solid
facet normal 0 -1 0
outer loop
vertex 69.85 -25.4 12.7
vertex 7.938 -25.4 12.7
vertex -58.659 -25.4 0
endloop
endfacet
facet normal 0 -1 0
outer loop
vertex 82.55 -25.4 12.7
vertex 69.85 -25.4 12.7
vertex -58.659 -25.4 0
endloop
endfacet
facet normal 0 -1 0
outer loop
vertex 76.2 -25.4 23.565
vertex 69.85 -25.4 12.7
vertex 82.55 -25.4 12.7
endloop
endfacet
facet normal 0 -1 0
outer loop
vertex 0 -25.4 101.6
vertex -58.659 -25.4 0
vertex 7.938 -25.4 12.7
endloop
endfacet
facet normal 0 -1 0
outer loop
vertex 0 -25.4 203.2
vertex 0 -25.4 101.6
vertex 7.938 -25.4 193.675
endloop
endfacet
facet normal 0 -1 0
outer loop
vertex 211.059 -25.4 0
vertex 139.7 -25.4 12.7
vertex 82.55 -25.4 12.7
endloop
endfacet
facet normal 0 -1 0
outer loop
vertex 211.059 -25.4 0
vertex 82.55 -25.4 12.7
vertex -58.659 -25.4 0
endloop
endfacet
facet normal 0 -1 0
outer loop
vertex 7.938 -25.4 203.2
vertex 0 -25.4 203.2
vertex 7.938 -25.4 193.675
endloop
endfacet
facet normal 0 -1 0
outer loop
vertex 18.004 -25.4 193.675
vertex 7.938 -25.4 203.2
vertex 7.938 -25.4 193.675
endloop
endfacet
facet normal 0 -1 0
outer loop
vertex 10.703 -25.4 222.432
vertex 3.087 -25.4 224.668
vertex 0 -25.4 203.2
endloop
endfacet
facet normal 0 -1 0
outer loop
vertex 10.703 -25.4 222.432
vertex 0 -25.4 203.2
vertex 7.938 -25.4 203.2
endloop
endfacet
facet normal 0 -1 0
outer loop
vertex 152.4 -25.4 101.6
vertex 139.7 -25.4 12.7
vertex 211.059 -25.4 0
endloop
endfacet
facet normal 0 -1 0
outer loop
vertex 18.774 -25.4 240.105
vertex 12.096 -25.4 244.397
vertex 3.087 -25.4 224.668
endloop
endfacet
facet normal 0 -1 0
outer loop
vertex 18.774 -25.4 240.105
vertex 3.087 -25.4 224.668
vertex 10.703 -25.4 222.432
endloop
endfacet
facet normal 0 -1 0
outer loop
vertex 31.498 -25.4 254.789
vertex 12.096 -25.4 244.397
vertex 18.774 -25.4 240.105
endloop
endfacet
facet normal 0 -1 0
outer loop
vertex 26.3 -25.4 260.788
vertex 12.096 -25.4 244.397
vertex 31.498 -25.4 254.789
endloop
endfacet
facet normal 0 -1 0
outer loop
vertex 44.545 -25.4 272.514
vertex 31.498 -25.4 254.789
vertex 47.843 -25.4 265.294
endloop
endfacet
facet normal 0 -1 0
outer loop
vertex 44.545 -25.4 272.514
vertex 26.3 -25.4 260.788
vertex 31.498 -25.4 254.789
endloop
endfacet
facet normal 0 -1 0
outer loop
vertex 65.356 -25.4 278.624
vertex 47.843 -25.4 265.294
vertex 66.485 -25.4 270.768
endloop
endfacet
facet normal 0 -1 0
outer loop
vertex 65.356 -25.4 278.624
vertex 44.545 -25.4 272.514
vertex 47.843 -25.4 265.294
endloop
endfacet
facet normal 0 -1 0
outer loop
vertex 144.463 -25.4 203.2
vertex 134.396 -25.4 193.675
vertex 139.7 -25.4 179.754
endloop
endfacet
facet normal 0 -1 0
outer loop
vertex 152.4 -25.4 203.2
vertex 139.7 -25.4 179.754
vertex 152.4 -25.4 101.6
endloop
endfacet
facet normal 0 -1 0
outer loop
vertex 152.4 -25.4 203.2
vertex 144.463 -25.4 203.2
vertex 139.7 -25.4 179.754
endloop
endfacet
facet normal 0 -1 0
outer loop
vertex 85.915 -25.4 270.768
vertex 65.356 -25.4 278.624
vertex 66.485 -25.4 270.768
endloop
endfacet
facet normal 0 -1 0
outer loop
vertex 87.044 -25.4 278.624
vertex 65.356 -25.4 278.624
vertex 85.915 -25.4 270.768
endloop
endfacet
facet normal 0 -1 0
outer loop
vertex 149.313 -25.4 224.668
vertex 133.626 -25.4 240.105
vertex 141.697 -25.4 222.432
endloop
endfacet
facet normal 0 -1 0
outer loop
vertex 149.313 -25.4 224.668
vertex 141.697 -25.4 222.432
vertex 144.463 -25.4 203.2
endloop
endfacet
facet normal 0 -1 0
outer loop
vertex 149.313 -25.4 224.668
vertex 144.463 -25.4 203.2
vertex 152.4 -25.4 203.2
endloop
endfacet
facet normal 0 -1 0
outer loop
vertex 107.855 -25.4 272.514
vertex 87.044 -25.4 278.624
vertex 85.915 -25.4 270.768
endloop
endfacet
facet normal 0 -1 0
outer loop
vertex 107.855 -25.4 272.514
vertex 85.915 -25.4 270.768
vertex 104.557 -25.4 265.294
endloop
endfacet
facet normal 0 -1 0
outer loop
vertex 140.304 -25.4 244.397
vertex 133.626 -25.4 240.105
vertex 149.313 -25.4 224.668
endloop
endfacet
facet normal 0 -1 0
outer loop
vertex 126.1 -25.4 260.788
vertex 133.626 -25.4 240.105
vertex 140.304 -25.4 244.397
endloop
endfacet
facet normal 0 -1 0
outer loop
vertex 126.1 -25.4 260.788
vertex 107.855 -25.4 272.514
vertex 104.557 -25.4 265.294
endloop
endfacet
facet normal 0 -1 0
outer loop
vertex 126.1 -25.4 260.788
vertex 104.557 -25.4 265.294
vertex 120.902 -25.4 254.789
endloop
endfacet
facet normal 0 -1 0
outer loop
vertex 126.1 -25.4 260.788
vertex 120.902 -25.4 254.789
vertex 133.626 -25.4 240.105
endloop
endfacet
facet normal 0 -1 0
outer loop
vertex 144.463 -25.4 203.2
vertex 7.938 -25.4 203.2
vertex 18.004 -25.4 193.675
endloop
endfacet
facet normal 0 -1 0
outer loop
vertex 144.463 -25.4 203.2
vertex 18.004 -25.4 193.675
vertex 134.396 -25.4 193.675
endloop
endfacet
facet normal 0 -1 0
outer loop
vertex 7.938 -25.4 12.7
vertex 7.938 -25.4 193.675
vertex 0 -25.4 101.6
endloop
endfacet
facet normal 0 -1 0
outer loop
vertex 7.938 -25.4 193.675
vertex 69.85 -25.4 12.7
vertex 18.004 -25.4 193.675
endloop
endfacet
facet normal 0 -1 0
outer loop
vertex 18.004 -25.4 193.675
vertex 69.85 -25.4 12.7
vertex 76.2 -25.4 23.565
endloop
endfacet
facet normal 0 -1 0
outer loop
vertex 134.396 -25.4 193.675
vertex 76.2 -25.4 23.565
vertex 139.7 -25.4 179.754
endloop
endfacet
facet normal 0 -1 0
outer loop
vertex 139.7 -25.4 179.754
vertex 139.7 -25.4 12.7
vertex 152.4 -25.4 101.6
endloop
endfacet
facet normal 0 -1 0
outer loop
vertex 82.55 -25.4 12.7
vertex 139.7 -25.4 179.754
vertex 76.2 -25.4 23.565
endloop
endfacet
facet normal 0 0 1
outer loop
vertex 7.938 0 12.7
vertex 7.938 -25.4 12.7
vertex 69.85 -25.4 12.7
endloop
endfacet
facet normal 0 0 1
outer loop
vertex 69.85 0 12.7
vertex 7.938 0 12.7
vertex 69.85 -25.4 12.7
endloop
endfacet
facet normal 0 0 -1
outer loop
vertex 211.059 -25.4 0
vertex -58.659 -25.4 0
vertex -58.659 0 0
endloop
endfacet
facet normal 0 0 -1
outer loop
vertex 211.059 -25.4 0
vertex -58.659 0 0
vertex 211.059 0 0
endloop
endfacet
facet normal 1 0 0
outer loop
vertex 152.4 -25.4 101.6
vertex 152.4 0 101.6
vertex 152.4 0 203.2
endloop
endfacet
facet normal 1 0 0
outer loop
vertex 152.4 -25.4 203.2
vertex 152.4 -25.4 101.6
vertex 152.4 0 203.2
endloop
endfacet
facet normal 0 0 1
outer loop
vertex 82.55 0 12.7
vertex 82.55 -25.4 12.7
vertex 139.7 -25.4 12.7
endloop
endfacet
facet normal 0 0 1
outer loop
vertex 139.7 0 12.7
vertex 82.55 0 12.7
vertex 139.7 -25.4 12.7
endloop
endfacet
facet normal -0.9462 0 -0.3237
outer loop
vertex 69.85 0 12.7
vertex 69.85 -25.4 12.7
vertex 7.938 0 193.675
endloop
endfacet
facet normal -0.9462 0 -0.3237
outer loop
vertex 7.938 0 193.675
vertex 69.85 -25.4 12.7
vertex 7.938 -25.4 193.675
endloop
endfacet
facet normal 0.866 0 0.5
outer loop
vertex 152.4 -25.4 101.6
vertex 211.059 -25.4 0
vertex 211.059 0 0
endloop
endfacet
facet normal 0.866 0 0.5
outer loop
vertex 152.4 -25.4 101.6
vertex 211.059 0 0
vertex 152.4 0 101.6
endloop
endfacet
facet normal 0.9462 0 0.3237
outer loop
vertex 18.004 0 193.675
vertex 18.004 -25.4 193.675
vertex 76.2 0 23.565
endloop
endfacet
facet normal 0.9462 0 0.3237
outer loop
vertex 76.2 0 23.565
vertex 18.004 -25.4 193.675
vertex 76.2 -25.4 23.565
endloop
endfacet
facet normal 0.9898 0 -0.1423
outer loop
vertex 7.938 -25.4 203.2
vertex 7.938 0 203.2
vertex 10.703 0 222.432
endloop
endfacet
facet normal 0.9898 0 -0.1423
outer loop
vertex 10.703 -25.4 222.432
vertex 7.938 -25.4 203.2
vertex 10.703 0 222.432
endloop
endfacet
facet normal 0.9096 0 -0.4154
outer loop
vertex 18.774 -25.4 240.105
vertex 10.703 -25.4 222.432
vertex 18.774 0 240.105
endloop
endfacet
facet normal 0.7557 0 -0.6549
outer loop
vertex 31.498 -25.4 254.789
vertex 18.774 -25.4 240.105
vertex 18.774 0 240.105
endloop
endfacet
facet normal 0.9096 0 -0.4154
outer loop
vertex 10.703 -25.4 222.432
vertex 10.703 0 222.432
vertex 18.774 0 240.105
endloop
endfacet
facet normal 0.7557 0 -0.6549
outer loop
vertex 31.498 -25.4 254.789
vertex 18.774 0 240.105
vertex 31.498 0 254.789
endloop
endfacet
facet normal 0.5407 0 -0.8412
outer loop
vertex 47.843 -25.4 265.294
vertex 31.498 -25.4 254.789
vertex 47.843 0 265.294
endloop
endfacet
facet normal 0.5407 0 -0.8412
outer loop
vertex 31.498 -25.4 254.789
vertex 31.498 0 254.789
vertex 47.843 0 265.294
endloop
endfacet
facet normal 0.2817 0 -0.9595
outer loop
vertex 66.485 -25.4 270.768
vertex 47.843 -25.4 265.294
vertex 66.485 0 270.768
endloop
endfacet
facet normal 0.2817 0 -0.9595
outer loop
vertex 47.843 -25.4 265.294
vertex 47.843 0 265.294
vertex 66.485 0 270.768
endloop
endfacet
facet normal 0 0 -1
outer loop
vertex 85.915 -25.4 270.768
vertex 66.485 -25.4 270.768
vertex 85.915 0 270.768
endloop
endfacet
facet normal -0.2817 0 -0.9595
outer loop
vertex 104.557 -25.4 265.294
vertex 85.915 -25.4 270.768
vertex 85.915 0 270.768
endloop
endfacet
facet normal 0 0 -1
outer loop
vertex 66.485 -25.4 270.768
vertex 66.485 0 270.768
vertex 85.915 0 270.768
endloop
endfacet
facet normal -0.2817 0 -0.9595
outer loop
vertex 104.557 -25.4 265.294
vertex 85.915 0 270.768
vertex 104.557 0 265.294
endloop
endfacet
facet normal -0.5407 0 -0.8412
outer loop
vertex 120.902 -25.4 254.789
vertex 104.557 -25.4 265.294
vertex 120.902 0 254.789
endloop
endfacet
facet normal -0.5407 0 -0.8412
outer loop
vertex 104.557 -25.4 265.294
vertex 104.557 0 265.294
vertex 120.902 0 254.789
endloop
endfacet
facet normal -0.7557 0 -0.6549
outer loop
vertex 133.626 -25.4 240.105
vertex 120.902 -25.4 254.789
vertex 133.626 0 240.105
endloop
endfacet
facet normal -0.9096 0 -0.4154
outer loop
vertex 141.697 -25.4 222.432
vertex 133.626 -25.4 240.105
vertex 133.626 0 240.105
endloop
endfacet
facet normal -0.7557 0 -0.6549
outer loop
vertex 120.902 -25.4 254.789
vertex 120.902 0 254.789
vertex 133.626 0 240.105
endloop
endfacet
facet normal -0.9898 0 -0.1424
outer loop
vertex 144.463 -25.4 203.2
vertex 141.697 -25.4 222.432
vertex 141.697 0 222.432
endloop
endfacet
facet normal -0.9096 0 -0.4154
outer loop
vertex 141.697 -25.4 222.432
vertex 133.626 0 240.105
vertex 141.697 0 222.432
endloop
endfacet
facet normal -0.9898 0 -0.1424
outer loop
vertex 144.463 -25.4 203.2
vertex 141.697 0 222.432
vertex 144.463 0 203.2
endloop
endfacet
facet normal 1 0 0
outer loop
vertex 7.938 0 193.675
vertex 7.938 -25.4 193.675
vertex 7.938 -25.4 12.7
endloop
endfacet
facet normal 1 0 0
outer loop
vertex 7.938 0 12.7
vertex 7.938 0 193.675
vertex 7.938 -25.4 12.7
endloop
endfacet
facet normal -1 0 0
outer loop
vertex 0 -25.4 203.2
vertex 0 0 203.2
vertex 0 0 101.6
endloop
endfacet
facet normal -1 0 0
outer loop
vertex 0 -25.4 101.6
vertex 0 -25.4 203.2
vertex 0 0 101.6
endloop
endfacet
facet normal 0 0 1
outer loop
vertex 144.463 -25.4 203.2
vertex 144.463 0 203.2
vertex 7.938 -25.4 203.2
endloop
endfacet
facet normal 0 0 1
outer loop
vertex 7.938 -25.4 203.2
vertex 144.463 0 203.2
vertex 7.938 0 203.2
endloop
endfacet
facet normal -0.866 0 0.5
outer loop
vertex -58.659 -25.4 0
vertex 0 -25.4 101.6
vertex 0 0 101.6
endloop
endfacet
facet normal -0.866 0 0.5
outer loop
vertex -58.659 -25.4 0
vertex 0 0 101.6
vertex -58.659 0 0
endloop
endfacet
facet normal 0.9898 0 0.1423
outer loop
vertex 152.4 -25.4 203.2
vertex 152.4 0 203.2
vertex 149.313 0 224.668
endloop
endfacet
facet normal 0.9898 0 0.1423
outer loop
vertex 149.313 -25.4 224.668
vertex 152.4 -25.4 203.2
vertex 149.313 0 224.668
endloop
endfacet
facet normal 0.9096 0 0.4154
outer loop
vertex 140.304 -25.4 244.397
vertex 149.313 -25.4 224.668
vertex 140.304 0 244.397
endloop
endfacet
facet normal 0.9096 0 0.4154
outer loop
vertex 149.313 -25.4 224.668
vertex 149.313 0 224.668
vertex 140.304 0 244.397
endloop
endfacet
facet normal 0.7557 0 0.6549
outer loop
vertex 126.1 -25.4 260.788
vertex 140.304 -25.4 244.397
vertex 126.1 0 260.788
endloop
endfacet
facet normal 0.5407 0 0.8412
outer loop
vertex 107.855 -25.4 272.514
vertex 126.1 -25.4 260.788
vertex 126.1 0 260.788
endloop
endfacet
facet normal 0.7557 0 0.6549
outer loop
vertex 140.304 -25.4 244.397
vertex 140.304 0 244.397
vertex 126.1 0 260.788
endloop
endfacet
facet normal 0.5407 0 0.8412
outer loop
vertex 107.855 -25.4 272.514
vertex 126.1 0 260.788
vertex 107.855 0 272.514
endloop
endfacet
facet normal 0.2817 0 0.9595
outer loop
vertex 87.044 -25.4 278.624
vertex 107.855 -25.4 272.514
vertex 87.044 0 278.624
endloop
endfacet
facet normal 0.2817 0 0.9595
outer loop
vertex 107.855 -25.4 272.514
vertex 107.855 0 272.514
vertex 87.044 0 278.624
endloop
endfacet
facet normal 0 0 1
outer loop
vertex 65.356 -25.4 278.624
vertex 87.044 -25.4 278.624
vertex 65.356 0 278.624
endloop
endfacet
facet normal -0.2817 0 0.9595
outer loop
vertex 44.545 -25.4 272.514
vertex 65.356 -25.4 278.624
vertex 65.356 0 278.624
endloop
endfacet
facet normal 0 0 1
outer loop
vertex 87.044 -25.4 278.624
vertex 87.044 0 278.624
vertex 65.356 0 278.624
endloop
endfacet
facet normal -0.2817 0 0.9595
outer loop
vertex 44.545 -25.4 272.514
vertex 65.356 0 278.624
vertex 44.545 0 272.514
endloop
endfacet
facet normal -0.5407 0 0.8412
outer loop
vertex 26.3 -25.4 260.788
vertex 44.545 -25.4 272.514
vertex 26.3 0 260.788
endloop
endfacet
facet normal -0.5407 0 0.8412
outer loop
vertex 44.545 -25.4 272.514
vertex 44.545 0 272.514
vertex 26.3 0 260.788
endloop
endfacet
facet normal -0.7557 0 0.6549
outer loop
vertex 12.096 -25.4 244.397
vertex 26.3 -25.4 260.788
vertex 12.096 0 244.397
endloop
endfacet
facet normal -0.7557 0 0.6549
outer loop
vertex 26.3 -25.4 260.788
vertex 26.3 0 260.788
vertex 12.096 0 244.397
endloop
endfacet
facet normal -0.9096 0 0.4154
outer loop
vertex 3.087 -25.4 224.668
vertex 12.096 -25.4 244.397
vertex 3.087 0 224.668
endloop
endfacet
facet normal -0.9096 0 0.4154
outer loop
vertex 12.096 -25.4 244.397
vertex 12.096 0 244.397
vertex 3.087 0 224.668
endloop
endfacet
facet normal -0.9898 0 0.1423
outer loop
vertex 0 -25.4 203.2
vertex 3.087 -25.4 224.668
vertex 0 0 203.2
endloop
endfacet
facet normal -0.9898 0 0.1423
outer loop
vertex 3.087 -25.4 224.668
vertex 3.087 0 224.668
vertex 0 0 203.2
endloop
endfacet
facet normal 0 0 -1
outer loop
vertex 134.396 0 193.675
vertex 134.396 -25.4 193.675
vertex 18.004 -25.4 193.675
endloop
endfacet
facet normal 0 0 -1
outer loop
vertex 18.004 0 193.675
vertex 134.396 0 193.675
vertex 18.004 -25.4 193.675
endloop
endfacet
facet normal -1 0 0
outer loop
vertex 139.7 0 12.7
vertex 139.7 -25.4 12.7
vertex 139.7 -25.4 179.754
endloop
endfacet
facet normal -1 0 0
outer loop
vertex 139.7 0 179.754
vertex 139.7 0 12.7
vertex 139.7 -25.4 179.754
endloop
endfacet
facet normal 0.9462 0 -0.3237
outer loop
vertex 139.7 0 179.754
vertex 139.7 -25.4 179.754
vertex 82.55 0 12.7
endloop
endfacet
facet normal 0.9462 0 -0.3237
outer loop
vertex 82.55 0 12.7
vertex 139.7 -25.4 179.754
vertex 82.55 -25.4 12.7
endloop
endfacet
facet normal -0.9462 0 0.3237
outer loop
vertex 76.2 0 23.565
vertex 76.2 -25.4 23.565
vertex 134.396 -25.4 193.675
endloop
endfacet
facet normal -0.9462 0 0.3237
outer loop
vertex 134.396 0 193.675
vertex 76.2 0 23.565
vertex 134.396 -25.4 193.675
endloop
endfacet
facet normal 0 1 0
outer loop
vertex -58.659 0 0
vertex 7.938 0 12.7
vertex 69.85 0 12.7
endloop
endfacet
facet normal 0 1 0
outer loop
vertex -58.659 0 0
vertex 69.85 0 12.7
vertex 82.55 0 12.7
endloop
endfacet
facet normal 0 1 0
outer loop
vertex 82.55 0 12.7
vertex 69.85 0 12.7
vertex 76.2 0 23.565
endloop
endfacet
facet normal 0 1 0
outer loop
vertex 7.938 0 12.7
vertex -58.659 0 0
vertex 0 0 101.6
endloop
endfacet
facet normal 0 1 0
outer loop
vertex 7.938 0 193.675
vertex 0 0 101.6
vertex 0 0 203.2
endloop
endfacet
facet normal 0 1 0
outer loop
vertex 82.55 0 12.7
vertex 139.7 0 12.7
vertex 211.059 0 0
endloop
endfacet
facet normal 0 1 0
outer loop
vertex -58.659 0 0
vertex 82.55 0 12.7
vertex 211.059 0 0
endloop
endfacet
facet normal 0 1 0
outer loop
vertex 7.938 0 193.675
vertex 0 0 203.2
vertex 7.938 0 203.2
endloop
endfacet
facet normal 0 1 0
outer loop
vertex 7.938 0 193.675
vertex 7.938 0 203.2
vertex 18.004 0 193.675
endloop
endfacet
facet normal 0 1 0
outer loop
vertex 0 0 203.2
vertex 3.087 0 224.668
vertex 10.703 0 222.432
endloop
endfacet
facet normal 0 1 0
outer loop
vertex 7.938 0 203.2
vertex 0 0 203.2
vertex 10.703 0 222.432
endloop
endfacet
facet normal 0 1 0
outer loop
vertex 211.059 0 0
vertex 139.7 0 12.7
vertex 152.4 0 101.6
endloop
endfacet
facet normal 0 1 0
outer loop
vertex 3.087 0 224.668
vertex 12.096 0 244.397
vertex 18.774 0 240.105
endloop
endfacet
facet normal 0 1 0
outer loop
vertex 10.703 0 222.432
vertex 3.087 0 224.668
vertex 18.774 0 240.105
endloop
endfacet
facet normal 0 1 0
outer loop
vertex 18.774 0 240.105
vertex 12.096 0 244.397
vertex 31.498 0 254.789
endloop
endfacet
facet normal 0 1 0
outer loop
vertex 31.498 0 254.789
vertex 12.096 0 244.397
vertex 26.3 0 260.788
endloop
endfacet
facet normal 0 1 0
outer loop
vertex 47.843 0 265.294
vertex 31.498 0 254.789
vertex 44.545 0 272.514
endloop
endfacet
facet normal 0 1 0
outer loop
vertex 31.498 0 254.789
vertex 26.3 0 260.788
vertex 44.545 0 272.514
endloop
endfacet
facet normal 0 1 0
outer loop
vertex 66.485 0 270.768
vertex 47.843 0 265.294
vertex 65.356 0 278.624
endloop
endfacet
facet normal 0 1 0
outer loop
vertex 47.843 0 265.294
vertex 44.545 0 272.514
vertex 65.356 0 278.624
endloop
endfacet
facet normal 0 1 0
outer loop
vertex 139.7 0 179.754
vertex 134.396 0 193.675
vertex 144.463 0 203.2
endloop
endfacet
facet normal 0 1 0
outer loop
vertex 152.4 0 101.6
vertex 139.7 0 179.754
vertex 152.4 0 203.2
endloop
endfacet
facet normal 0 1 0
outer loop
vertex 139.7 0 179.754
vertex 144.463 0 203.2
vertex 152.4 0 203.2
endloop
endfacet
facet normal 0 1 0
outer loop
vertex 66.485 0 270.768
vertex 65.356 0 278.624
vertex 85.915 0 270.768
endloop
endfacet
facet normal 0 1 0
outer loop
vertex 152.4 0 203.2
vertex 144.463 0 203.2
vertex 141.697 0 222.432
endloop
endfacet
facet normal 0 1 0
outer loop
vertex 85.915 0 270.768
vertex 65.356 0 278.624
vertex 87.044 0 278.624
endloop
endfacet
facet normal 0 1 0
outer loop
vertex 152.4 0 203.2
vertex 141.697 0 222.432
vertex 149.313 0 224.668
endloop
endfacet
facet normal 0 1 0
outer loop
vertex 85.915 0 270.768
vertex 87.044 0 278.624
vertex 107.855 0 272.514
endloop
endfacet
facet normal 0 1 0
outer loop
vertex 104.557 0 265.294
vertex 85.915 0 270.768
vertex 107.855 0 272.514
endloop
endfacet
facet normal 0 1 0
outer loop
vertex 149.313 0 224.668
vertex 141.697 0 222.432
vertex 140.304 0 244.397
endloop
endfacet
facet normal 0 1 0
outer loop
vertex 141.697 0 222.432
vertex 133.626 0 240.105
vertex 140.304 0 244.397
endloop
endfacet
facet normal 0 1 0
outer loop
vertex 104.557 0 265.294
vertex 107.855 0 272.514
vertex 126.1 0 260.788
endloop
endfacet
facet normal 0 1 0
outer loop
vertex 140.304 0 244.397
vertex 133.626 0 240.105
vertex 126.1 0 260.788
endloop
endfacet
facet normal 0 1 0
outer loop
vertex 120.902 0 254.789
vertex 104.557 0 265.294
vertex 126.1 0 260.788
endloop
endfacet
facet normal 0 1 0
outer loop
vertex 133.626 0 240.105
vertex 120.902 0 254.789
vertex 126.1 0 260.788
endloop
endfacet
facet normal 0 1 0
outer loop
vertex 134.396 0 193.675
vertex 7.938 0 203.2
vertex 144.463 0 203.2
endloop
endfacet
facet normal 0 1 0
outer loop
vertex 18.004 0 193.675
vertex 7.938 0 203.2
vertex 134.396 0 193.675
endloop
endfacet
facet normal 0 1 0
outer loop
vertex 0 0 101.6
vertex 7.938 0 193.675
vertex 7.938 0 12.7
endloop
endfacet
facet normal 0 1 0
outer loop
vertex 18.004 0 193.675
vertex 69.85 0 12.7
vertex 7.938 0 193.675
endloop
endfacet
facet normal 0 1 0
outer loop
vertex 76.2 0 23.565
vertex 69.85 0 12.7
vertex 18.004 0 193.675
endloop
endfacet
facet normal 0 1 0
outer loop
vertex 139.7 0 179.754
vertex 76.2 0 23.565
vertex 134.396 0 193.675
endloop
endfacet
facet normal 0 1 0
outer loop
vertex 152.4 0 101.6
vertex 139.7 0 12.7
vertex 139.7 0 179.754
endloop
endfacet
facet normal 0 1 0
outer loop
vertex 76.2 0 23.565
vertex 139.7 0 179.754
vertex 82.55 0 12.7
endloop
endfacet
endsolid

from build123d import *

# Parameters (mm, degrees)
F1_DEPTH = 25.4
F3_DEPTH = 25.401
F5_DEPTH = 25.4


with BuildPart() as f1:
    # F0 (on Front) → F1 (new body)
    with BuildSketch(Plane.XZ):
        with BuildLine():
            Line((0, 203.2), (0, 0))
            Line((0, 0), (152.4, 0))
            Line((152.4, 0), (152.4, 203.2))
            ThreePointArc((152.4, 203.2), (76.2, 279.4), (0, 203.2))
        make_face()
        with BuildLine():
            ThreePointArc((7.9375, 203.2), (76.2, 271.4625), (144.4625, 203.2))
            Line((144.4625, 203.2), (7.9375, 203.2))
        make_face(mode=Mode.SUBTRACT)
    extrude(amount=F1_DEPTH)

    # F2 (on face) → F3 (cut, through all)
    with BuildSketch(Plane.XZ.offset(25.4)):
        Polygon((7.9375, 193.675), (7.9375, 12.7), (69.85, 12.7), align=None)
        Polygon((139.7, 12.7), (139.7, 179.753846), (82.55, 12.7), align=None)
        Polygon((134.395535, 193.675), (18.004465, 193.675), (76.2, 23.564975), align=None)
    extrude(amount=-F3_DEPTH, mode=Mode.SUBTRACT)

    # F4 (on face) → F5 (join, through all)
    with BuildSketch(Plane.XZ.offset(25.4)):
        Polygon((0, 0), (0, 101.6), (-58.658787, 0), align=None)
        Polygon((211.058787, 0), (152.4, 101.6), (152.4, 0), align=None)
    extrude(amount=-F5_DEPTH)


solid = f1.part
